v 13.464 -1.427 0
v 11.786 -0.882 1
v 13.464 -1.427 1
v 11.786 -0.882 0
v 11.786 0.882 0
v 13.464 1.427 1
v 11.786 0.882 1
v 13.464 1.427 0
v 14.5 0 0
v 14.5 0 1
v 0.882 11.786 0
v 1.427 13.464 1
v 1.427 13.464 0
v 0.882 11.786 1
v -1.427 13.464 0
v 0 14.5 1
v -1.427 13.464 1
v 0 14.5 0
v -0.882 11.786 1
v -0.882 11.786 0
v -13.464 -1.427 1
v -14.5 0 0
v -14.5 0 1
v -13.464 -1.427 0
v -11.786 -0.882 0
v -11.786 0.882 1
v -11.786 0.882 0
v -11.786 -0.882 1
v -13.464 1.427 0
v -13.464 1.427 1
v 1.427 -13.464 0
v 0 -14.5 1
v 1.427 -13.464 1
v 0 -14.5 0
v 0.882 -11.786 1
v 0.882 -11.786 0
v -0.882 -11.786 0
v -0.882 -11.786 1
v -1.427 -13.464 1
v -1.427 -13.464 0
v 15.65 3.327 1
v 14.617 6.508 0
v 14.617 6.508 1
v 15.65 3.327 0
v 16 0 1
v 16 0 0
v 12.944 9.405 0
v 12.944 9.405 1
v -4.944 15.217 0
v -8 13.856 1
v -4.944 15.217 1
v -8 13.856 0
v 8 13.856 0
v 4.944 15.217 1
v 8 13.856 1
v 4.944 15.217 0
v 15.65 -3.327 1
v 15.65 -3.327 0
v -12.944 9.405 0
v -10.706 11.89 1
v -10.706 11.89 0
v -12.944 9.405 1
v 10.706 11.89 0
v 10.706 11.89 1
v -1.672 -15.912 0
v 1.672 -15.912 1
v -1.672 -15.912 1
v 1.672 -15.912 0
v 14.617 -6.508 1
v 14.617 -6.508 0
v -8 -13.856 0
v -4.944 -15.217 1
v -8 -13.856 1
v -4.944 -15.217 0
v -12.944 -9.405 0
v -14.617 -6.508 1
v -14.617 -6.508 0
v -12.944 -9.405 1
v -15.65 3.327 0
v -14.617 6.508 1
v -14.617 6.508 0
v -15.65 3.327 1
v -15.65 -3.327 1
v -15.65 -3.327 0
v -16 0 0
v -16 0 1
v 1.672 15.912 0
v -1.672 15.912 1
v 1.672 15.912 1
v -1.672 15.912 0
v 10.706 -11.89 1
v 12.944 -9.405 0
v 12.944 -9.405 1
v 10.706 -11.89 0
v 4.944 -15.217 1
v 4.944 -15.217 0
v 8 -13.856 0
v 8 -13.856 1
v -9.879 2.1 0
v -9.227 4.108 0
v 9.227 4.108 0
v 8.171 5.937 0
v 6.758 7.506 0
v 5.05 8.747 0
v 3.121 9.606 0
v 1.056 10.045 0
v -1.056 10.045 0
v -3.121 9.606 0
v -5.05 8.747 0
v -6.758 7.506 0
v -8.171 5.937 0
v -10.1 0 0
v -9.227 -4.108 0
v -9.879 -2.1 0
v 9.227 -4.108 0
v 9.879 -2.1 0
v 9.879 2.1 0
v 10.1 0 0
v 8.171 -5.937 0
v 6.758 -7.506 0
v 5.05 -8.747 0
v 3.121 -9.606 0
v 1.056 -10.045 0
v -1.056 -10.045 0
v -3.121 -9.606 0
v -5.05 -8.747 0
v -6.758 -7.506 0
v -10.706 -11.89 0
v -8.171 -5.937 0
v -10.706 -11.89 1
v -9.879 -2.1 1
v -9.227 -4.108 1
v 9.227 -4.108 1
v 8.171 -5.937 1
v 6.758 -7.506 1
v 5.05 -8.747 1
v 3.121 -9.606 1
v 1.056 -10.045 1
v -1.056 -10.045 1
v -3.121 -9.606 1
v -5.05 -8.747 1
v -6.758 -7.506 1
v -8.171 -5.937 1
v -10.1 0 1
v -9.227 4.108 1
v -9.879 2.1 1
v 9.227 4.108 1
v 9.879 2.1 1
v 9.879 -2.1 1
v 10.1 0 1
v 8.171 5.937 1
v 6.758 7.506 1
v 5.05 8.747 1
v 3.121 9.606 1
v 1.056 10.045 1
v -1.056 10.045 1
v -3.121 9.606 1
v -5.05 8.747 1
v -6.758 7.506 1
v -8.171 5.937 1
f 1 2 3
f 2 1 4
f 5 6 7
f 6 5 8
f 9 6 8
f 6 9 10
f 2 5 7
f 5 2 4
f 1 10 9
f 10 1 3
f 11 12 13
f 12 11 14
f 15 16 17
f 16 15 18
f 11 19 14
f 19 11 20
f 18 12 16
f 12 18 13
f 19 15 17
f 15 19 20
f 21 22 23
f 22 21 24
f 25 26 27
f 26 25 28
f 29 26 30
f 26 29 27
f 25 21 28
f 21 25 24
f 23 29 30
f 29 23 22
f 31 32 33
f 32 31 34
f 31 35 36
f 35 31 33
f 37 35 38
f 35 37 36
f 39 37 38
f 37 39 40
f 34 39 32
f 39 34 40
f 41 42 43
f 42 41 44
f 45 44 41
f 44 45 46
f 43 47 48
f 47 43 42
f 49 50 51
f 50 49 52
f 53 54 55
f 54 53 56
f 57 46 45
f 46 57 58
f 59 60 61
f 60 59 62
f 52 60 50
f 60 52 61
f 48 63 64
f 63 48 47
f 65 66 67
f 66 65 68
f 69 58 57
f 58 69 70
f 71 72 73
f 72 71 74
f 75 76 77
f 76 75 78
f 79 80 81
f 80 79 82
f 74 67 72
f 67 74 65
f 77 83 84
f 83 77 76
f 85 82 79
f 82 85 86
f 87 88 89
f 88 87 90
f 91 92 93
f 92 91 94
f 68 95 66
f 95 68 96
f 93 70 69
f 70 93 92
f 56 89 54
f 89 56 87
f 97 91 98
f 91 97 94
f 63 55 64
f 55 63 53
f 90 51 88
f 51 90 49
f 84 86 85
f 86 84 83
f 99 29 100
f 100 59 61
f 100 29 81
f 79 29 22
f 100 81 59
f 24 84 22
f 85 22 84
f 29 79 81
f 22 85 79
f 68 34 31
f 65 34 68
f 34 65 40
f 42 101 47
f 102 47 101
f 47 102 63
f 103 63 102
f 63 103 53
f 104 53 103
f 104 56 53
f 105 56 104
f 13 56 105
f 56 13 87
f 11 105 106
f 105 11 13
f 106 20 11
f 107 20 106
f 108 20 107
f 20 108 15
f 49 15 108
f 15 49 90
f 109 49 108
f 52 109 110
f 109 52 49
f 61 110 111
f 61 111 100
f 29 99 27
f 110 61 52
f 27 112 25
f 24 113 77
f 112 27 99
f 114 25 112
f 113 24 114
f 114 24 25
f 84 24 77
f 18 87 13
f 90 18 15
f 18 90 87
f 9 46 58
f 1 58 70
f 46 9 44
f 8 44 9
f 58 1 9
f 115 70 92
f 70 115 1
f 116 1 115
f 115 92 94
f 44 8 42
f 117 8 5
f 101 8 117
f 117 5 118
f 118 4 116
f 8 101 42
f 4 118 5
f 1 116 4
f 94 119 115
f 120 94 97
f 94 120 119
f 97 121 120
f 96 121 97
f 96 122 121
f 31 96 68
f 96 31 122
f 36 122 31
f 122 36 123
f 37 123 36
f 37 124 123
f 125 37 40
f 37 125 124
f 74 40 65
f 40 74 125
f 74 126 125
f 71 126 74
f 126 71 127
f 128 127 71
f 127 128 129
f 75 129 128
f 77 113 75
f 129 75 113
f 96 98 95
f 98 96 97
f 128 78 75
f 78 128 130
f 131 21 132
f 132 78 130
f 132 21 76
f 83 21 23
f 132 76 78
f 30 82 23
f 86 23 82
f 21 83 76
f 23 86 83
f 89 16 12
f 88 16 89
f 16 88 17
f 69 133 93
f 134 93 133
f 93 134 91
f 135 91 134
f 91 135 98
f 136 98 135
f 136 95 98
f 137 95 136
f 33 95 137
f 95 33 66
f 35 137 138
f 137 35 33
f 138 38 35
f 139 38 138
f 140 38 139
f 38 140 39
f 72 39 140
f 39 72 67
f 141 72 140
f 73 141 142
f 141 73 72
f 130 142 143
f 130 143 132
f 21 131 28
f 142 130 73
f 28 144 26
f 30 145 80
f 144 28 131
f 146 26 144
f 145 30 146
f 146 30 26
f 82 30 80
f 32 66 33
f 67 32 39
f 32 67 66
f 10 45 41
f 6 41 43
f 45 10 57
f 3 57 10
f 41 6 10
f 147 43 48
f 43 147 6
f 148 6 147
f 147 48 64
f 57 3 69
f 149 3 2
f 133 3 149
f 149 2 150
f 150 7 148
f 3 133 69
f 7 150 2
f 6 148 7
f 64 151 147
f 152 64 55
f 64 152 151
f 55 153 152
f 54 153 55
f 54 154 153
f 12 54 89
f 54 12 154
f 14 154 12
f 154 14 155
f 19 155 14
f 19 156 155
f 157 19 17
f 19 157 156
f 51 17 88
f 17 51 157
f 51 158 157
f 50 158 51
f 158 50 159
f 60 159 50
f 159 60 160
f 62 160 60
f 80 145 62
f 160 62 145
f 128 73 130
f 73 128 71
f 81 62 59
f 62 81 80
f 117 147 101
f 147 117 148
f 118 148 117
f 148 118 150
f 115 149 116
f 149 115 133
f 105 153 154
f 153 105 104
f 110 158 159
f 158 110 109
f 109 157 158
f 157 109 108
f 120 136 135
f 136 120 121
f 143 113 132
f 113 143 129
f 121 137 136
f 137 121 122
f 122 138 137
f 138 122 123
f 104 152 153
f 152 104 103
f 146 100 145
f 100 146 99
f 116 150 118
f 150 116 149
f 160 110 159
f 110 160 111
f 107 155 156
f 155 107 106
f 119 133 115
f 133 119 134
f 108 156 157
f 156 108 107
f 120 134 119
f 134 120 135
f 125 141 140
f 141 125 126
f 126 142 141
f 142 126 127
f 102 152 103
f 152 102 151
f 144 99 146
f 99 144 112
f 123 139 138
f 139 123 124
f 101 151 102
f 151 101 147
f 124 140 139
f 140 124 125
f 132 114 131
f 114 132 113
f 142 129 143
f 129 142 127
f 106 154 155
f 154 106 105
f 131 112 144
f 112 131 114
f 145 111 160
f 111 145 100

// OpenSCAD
// part_id: sp7
// name: SP7 companion ring
// source_drawing_ids: DRW-022;DRW-056
// units: mm
// revision: 0.1-placeholder
// SPDX-License-Identifier: MIT

module part_sp7(od = 32.0, thickness = 1.0, bore_d = 20.2, bolt_d = 3.0, bolt_r = 13.0) {
    difference() {
        cylinder(d = od, h = thickness, center = false);
        translate([0, 0, -0.1]) cylinder(d = bore_d, h = thickness + 0.2, center = false);
        for (a = [0, 90, 180, 270]) {
            rotate([0, 0, a]) translate([bolt_r, 0, -0.1])
                cylinder(d = bolt_d, h = thickness + 0.2, center = false);
        }
    }
}

// ---- "main guard" ----
// Default to previewing when opened directly:
if (is_undef(__LIB_MODE__)) {
    part_sp7();
}
